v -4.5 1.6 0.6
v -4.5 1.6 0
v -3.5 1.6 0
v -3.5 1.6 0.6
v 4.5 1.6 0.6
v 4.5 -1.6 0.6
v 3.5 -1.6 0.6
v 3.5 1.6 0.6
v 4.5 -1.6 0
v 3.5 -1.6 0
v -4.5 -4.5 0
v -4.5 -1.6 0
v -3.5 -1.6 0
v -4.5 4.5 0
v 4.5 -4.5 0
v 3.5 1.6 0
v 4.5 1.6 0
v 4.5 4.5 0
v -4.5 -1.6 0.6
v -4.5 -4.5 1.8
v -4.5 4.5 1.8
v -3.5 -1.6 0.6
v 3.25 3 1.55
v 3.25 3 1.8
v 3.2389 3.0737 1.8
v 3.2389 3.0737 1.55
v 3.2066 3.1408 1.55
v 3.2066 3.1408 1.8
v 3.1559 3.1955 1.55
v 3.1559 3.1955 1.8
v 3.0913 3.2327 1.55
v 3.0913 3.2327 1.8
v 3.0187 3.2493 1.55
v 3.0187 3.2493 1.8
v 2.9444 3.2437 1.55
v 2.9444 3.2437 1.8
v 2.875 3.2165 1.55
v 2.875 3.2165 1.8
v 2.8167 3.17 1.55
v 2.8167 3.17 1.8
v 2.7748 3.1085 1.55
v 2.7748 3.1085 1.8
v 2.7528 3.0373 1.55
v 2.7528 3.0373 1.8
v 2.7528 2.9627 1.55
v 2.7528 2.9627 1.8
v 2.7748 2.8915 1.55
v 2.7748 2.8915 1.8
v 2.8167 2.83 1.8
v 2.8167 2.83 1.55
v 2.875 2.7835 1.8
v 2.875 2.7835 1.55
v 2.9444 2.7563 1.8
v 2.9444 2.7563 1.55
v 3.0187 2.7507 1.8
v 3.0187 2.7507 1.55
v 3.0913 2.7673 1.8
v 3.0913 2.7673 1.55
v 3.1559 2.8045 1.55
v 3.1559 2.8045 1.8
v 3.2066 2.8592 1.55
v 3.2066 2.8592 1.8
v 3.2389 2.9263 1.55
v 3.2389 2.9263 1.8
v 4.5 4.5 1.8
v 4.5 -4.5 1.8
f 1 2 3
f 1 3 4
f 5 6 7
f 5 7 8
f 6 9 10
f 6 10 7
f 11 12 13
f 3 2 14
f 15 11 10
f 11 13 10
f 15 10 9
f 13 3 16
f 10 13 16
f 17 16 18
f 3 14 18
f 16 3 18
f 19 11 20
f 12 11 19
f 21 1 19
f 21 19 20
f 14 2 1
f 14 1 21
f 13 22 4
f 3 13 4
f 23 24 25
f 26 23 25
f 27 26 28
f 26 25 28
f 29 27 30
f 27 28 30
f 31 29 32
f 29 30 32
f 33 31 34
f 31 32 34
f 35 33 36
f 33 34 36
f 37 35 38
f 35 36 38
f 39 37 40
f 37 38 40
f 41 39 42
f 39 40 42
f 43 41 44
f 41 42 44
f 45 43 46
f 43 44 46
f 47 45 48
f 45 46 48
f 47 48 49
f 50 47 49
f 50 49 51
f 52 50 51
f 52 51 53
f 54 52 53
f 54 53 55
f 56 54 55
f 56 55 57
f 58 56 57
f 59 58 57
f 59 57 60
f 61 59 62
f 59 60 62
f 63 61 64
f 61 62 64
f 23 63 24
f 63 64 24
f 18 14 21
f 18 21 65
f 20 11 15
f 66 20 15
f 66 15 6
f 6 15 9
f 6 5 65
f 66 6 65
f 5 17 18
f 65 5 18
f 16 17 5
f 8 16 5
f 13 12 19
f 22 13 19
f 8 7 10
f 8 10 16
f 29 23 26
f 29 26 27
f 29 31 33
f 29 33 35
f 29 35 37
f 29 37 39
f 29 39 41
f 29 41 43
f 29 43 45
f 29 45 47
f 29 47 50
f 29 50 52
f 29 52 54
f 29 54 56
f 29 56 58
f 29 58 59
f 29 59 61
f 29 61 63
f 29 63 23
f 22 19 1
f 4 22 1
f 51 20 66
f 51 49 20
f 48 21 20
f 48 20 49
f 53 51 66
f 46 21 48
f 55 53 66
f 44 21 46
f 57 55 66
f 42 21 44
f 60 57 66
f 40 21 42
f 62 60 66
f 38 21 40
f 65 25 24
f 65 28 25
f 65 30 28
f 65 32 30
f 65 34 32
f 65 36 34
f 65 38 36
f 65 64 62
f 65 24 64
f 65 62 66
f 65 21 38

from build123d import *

# Parameters (mm, degrees)
SKETCH_W        = 9
SKETCH_H        = 9
PAD_DEPTH       = 1.8
SKETCH001_R     = 0.25
POCKET_DEPTH    = 0.25
SKETCH002_W     = 3.2
SKETCH002_H     = 0.6
POCKET001_DEPTH = 1


with BuildPart() as part:
    # Sketch → Pad (new body)
    with BuildSketch(Plane.XY):
        Rectangle(SKETCH_W, SKETCH_H)
    extrude(amount=PAD_DEPTH)

    # Sketch001 (on Face6 of Pad) → Pocket (cut)
    with BuildSketch(Plane.XY.offset(1.8)):
        with Locations((3, 3)):
            Circle(SKETCH001_R)
    extrude(amount=-POCKET_DEPTH, mode=Mode.SUBTRACT)

    # Sketch002 (on Face6 of Pocket) → Pocket001 (cut)
    with BuildSketch(Plane.YZ.offset(4.5)):
        with Locations((0, 0.3)):
            Rectangle(SKETCH002_W, SKETCH002_H)
    pocket001 = extrude(amount=-POCKET001_DEPTH, mode=Mode.SUBTRACT)

    # Mirrored: Pocket001 across YZ
    add(pocket001.mirror(Plane.YZ), mode=Mode.SUBTRACT)


solid = part.part
